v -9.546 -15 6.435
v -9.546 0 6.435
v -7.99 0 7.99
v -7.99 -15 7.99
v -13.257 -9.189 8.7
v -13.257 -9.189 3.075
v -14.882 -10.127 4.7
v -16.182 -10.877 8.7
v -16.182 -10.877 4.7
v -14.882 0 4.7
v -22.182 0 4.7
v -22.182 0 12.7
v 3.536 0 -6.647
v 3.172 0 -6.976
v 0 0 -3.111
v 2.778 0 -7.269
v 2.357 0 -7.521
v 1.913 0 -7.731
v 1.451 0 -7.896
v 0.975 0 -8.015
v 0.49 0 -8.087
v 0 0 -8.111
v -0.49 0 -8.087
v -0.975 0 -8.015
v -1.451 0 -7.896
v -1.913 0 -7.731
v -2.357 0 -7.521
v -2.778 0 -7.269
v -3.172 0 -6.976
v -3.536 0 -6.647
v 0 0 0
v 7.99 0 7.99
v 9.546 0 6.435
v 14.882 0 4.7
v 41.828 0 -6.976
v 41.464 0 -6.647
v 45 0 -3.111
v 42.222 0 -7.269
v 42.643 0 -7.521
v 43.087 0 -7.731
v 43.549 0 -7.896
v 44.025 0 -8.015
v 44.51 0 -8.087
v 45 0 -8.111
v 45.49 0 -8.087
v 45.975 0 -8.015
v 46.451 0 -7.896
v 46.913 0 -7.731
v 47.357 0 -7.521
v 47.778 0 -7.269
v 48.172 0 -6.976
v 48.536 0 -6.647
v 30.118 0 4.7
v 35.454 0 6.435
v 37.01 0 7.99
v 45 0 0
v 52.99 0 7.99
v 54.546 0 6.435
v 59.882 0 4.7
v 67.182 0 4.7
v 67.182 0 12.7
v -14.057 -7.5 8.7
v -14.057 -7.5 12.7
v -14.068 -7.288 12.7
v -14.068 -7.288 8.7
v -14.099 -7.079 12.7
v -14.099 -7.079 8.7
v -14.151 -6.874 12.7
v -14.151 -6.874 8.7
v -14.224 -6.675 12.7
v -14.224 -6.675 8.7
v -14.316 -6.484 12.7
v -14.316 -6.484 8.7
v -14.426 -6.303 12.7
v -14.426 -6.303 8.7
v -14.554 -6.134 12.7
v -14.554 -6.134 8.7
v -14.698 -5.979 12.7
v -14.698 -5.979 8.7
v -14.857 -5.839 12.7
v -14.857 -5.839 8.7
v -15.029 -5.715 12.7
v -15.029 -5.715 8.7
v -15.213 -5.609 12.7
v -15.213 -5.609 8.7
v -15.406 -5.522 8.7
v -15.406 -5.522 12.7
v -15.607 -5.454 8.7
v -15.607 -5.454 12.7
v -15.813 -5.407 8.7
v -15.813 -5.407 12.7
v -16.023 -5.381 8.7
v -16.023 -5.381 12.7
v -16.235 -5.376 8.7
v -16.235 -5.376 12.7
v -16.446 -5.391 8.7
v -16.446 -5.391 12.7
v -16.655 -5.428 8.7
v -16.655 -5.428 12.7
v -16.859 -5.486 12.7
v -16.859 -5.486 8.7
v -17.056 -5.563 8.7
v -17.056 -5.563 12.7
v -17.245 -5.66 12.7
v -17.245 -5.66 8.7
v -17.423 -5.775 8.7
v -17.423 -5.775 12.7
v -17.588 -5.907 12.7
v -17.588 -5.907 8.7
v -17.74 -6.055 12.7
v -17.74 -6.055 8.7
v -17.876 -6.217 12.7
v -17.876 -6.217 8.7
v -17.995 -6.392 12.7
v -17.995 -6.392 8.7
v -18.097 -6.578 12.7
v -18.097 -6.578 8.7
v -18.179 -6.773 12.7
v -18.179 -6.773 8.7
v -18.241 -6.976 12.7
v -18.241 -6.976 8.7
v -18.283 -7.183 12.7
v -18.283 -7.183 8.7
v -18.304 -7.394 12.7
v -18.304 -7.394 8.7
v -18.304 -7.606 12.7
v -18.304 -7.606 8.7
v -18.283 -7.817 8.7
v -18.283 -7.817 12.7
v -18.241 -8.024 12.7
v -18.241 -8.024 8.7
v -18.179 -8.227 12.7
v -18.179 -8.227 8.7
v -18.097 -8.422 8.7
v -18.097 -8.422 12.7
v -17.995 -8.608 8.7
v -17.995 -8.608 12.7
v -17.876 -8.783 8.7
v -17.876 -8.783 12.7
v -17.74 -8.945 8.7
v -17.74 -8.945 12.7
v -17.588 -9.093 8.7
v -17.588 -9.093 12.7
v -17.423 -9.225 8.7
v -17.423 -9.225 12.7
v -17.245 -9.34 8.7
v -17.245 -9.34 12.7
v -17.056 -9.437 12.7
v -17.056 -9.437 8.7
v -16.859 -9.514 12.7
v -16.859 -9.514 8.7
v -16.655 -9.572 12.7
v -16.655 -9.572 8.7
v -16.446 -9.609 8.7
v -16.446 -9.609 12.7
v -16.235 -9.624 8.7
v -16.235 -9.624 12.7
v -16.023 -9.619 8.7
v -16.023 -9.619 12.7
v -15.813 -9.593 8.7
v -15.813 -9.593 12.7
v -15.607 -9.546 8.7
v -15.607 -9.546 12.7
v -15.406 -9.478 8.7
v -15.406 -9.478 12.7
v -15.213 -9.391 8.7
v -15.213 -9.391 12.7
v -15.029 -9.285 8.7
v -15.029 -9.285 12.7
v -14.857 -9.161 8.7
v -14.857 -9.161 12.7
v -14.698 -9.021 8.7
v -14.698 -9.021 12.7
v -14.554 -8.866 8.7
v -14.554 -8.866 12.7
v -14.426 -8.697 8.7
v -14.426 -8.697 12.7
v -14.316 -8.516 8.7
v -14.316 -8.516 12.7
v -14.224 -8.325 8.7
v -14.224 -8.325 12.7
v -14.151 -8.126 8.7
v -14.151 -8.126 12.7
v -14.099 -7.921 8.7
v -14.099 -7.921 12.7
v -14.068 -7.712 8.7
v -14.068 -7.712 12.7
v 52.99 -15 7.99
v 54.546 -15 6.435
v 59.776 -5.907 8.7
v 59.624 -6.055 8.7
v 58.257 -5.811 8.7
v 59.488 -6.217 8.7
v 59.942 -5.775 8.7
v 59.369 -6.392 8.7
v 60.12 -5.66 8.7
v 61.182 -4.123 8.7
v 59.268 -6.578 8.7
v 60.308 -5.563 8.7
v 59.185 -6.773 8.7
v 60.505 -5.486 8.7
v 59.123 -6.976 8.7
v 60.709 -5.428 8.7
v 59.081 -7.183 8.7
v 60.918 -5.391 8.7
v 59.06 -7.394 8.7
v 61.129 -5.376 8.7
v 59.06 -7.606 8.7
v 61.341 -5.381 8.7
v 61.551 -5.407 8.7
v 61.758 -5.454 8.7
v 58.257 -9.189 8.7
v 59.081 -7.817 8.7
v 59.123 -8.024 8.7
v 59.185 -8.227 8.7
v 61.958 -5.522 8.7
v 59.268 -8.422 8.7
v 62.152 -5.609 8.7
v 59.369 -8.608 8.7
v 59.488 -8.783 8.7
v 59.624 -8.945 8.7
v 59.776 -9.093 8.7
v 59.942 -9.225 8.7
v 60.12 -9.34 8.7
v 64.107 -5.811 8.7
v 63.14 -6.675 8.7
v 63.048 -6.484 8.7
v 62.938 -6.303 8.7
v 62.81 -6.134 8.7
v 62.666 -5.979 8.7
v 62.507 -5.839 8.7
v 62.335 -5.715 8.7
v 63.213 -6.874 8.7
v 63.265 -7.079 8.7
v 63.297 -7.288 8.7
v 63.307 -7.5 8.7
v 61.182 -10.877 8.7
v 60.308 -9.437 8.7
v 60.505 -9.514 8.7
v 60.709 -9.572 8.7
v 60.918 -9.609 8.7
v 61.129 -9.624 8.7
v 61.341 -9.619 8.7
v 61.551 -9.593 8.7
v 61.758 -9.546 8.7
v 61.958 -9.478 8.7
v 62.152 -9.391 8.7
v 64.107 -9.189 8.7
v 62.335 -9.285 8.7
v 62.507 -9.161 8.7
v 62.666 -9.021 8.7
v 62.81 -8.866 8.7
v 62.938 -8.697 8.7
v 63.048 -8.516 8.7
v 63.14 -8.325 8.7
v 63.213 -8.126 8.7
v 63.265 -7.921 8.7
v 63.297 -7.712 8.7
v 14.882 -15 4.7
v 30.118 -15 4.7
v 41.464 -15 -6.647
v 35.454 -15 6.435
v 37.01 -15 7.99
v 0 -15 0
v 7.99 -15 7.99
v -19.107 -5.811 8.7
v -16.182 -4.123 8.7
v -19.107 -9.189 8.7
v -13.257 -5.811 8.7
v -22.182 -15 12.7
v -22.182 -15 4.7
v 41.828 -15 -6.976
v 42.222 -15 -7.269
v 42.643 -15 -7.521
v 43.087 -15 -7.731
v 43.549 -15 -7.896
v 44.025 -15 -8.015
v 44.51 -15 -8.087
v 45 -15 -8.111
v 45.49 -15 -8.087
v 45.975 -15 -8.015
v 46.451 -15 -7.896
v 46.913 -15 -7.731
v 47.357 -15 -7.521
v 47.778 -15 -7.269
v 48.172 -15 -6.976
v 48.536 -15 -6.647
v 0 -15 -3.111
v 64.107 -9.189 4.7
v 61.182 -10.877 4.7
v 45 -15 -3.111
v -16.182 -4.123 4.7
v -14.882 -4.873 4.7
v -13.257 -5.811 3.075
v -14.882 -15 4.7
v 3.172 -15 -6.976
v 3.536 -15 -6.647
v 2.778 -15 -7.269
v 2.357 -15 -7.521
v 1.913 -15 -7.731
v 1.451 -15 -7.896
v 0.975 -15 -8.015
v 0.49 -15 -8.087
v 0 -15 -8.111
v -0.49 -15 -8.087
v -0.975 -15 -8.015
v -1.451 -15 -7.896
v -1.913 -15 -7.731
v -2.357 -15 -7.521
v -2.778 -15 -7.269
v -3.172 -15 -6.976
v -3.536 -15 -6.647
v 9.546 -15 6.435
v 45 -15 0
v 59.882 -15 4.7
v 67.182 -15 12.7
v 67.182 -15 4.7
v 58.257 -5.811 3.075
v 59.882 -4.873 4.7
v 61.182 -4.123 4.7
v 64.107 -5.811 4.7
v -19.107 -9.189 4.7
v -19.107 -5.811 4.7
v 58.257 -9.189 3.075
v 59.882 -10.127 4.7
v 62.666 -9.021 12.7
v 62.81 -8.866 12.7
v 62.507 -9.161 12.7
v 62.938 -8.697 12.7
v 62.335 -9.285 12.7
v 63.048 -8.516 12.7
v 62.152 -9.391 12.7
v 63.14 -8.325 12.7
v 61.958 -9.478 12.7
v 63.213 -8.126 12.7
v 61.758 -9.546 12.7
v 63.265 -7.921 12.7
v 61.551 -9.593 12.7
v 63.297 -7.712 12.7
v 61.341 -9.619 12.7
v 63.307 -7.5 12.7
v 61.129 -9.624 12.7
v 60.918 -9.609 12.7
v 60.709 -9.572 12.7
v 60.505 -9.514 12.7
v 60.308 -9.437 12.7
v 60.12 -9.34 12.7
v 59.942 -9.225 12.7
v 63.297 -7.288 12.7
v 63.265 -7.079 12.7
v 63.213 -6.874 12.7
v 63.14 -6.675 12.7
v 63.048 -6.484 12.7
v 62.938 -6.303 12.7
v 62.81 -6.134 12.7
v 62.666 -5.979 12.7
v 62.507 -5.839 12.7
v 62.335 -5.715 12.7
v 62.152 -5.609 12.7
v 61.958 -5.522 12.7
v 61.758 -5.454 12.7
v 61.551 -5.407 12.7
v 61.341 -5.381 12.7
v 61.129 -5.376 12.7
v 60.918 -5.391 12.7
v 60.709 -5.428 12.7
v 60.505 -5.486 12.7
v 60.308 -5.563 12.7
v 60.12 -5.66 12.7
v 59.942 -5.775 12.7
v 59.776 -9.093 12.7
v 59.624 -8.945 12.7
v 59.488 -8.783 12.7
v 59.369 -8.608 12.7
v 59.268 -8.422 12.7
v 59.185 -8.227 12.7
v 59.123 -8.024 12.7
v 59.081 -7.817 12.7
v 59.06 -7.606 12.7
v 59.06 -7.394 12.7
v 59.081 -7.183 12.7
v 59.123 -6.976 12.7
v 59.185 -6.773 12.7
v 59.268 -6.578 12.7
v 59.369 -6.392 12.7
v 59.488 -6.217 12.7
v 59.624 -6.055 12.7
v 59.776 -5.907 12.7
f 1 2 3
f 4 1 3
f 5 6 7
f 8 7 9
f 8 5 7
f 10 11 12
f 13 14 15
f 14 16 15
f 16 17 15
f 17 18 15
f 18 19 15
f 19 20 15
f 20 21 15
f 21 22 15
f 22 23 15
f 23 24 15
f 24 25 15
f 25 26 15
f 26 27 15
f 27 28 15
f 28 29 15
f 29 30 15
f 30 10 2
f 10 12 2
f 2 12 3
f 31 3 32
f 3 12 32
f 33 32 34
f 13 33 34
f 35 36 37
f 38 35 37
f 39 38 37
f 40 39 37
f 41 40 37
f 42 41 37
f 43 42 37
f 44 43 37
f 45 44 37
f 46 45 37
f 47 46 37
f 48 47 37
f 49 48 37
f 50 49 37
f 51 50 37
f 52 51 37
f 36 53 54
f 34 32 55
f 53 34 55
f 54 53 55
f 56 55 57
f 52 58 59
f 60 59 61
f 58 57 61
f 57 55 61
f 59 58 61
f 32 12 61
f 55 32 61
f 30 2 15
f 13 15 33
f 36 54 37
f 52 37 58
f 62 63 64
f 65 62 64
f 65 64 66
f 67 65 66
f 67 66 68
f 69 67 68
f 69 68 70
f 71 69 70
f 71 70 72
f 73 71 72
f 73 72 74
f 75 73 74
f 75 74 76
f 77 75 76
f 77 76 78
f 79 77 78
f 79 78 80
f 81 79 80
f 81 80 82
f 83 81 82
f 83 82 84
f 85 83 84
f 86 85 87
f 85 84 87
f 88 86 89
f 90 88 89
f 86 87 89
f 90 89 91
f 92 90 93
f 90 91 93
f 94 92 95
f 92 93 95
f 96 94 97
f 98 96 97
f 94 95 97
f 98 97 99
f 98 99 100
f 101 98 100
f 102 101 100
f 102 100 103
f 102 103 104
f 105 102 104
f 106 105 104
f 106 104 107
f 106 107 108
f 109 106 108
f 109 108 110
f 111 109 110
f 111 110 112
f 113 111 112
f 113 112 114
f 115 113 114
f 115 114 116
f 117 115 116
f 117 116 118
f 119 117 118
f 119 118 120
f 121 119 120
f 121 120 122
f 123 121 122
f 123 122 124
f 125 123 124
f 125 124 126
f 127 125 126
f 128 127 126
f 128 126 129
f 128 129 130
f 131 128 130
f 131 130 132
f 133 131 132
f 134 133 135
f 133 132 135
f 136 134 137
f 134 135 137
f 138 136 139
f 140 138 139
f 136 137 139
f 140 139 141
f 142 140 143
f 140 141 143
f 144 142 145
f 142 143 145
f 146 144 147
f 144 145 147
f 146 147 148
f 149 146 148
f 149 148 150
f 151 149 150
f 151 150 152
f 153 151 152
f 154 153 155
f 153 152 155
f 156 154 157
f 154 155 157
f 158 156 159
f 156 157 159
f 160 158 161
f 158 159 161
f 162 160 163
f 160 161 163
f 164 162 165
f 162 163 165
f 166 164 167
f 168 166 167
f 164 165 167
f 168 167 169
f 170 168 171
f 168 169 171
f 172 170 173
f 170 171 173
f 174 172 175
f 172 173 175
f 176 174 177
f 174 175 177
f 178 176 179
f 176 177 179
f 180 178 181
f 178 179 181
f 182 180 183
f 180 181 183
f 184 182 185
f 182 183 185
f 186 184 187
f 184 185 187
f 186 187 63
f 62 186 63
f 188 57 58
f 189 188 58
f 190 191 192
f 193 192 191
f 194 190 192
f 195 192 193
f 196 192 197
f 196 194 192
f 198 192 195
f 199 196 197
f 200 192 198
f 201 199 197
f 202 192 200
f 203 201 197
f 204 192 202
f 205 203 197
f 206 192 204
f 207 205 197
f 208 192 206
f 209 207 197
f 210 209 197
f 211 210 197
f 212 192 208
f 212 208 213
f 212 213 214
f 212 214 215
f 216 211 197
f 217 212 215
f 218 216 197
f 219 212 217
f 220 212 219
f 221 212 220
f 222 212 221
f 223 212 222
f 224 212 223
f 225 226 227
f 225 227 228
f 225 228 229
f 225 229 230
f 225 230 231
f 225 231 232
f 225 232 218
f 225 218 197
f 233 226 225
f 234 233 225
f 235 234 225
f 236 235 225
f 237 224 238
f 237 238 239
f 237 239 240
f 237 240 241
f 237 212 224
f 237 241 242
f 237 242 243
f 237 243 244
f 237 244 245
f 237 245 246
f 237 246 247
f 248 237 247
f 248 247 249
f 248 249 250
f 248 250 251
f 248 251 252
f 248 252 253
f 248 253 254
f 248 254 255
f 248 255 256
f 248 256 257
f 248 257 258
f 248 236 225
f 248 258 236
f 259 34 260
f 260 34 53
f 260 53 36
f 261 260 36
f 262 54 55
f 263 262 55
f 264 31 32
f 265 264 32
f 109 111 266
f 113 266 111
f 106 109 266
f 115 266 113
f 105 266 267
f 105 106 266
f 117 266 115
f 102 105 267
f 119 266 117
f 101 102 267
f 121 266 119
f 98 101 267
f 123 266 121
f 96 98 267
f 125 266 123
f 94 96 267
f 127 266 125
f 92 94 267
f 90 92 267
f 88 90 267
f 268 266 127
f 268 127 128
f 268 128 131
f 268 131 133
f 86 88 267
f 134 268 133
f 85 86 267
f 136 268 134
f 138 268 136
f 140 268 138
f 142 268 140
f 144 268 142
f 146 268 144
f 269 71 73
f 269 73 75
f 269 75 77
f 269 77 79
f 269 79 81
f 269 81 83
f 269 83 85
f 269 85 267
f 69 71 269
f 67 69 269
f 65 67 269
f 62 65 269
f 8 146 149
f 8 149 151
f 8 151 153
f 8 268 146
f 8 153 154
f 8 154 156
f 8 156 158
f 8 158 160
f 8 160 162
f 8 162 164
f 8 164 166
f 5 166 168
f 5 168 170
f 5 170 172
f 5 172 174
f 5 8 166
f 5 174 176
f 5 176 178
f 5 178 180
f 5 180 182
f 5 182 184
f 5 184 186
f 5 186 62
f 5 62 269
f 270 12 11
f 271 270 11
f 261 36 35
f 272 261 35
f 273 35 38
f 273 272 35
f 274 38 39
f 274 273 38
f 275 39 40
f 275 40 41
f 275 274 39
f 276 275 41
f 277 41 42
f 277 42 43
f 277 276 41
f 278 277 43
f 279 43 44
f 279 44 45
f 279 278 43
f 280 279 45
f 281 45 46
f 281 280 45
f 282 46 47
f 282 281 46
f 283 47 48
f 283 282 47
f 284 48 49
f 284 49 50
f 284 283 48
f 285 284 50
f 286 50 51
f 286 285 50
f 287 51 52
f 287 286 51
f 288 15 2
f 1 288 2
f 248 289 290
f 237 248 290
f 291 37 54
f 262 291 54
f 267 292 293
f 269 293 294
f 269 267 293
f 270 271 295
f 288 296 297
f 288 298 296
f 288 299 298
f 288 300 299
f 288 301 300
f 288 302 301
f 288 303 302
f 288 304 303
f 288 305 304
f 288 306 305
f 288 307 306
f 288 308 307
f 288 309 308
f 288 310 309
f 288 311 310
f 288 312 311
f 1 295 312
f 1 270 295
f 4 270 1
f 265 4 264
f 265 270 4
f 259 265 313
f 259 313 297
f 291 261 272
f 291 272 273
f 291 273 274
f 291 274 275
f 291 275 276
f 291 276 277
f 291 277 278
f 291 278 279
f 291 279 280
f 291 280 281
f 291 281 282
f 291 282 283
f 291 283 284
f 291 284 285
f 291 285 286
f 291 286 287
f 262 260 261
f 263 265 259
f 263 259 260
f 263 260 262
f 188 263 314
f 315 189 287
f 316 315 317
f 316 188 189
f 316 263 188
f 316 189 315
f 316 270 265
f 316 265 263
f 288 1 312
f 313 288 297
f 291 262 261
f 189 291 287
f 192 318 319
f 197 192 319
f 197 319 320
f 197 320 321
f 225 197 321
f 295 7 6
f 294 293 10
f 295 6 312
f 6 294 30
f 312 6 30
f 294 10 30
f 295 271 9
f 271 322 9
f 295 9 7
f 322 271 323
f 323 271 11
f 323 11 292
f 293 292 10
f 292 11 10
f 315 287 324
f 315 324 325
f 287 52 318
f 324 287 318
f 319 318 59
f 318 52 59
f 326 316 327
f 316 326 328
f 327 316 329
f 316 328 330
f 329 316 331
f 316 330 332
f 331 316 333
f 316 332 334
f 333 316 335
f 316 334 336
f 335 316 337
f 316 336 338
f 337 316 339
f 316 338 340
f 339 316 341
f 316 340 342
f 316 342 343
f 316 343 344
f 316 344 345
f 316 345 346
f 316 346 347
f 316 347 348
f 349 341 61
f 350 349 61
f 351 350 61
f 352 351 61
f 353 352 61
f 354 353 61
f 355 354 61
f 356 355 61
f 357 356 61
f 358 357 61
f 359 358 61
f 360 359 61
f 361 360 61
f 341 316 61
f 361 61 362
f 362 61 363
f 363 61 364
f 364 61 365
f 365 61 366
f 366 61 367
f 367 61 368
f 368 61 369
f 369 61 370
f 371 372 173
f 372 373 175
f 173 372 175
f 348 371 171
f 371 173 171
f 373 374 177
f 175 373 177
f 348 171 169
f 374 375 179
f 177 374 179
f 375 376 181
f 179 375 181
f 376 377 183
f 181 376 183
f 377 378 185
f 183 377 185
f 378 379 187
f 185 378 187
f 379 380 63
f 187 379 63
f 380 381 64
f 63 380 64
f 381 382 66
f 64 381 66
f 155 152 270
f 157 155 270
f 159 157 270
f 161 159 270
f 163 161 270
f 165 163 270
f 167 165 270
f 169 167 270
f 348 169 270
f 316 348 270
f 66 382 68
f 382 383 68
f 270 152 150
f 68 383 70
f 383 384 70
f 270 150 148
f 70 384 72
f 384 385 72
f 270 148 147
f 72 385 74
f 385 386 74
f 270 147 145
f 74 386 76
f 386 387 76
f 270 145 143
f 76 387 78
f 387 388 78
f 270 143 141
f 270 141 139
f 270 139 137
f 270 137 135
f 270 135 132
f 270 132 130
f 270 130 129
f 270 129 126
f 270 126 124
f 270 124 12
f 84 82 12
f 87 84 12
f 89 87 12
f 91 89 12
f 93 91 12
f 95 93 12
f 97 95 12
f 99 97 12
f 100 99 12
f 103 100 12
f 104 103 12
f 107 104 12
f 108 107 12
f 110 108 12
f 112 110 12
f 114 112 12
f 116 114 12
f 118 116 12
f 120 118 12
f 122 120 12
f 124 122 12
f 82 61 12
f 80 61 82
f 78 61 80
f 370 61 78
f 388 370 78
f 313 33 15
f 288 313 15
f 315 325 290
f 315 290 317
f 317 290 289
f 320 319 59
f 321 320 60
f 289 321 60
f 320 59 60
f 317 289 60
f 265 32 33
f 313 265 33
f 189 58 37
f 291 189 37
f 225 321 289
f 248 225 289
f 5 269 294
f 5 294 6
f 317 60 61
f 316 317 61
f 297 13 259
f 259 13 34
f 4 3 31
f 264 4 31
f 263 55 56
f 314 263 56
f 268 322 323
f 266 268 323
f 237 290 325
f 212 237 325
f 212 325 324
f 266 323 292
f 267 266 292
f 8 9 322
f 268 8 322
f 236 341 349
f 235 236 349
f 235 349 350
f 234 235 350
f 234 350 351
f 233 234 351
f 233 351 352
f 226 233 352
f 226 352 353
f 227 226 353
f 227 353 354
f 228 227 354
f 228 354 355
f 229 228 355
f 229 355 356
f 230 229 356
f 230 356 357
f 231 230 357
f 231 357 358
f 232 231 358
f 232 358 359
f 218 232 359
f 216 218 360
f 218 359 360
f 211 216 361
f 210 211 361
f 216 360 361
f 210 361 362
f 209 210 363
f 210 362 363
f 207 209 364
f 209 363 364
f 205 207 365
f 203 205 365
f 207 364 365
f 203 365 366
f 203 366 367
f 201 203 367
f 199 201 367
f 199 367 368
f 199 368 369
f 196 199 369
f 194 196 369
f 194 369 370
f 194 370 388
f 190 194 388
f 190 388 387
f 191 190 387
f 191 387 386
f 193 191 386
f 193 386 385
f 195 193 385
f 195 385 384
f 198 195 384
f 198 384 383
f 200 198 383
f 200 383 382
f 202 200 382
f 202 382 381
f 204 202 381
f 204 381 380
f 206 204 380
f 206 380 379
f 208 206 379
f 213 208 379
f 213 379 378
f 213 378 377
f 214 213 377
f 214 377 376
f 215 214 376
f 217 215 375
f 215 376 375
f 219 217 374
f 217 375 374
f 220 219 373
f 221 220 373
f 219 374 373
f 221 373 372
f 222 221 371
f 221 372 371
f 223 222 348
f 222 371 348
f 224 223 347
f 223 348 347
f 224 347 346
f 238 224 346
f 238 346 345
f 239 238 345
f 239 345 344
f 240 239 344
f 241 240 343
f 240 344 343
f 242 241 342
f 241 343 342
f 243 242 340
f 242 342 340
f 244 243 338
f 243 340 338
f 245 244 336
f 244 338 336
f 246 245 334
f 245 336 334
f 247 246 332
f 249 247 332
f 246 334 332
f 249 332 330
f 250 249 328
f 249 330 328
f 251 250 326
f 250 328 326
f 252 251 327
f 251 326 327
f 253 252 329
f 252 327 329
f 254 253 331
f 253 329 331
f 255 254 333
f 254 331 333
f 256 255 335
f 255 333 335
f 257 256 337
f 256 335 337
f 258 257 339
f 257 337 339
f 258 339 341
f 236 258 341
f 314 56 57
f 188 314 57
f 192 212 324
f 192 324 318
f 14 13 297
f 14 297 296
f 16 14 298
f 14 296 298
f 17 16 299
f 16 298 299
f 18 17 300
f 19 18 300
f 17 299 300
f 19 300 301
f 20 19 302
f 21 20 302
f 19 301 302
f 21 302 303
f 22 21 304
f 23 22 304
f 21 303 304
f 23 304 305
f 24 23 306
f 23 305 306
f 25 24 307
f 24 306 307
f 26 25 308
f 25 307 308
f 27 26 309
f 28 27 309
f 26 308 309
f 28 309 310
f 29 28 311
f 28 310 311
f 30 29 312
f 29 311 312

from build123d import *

# Parameters (mm, degrees)
F1_DEPTH = 15
F2_R     = 2.125
F3_DEPTH = 25
F5_DEPTH = 4
F6_R     = 5
F8_DEPTH = 25


with BuildPart() as f1:
    # F0 (on Front) → F1 (new body)
    with BuildSketch(Plane.XZ):
        Polygon((22.182061, 12.7), (15.317939, 12.7), (14.682061, 12.7), (-14.682061, 12.7), (-22.182061, 12.7), (-22.182061, 4.7), (-14.882338, 4.7), (-7.5, -2.682338), (0, -10.182338), (7.5, -2.682338), (14.882338, 4.7), (30.117662, 4.7), (37.5, -2.682338), (45, -10.182338), (52.5, -2.682338), (59.882338, 4.7), (67.182061, 4.7), (67.182061, 12.7), (59.682061, 12.7), (30.317939, 12.7), (29.682061, 12.7), (22.817939, 12.7), align=None)
        Polygon((-9.545942, 6.434672), (-7.990307, 7.990307), (0, 0), (7.990307, 7.990307), (9.545942, 6.434672), (0, -3.11127), align=None, mode=Mode.SUBTRACT)
        Polygon((35.454058, 6.434672), (37.009693, 7.990307), (45, 0), (52.990307, 7.990307), (54.545942, 6.434672), (45, -3.11127), align=None, mode=Mode.SUBTRACT)
    extrude(amount=F1_DEPTH)

    # F2 (on face) → F3 (cut)
    with BuildSketch(Plane.XY.offset(12.7)):
        with Locations((-16.182061, -7.5)):
            Circle(F2_R)
        with Locations((61.182061, -7.5)):
            Circle(F2_R)
    extrude(amount=-F3_DEPTH, mode=Mode.SUBTRACT)

    # F4 (on face) → F5 (cut)
    with BuildSketch(Plane(origin=(0, 0, 4.7), x_dir=(1, 0, 0), z_dir=(0, 0, -1))):
        Polygon((-19.107061, 9.18875), (-19.107061, 5.81125), (-16.182061, 4.122501), (-13.257061, 5.81125), (-13.257061, 9.18875), (-16.182061, 10.877499), align=None)
        Polygon((64.107061, 5.81125), (64.107061, 9.18875), (61.182061, 10.877499), (58.257061, 9.18875), (58.257061, 5.81125), (61.182061, 4.122501), align=None)
    extrude(amount=-F5_DEPTH, mode=Mode.SUBTRACT)

    # F6
    f6_edges = [f1.edges().sort_by_distance(p)[0] for p in [
        (0, -7.5, -10.182338),
        (45, -7.5, -10.182338),
    ]]
    fillet(f6_edges, radius=F6_R)

    # F7 (on face) → F8 (cut)
    with BuildSketch(Plane(origin=(0, 0, 8.7), x_dir=(1, 0, 0), z_dir=(0, 0, -1))):
        Polygon((-19.107061, 9.18875), (-19.107061, 5.81125), (-16.182061, 4.122501), (-13.257061, 5.81125), (-13.257061, 9.18875), (-16.182061, 10.877499), align=None)
        Polygon((64.107061, 5.81125), (64.107061, 9.18875), (61.182061, 10.877499), (58.257061, 9.18875), (58.257061, 5.81125), (61.182061, 4.122501), align=None)
    extrude(amount=F8_DEPTH, mode=Mode.SUBTRACT)


solid = f1.part
